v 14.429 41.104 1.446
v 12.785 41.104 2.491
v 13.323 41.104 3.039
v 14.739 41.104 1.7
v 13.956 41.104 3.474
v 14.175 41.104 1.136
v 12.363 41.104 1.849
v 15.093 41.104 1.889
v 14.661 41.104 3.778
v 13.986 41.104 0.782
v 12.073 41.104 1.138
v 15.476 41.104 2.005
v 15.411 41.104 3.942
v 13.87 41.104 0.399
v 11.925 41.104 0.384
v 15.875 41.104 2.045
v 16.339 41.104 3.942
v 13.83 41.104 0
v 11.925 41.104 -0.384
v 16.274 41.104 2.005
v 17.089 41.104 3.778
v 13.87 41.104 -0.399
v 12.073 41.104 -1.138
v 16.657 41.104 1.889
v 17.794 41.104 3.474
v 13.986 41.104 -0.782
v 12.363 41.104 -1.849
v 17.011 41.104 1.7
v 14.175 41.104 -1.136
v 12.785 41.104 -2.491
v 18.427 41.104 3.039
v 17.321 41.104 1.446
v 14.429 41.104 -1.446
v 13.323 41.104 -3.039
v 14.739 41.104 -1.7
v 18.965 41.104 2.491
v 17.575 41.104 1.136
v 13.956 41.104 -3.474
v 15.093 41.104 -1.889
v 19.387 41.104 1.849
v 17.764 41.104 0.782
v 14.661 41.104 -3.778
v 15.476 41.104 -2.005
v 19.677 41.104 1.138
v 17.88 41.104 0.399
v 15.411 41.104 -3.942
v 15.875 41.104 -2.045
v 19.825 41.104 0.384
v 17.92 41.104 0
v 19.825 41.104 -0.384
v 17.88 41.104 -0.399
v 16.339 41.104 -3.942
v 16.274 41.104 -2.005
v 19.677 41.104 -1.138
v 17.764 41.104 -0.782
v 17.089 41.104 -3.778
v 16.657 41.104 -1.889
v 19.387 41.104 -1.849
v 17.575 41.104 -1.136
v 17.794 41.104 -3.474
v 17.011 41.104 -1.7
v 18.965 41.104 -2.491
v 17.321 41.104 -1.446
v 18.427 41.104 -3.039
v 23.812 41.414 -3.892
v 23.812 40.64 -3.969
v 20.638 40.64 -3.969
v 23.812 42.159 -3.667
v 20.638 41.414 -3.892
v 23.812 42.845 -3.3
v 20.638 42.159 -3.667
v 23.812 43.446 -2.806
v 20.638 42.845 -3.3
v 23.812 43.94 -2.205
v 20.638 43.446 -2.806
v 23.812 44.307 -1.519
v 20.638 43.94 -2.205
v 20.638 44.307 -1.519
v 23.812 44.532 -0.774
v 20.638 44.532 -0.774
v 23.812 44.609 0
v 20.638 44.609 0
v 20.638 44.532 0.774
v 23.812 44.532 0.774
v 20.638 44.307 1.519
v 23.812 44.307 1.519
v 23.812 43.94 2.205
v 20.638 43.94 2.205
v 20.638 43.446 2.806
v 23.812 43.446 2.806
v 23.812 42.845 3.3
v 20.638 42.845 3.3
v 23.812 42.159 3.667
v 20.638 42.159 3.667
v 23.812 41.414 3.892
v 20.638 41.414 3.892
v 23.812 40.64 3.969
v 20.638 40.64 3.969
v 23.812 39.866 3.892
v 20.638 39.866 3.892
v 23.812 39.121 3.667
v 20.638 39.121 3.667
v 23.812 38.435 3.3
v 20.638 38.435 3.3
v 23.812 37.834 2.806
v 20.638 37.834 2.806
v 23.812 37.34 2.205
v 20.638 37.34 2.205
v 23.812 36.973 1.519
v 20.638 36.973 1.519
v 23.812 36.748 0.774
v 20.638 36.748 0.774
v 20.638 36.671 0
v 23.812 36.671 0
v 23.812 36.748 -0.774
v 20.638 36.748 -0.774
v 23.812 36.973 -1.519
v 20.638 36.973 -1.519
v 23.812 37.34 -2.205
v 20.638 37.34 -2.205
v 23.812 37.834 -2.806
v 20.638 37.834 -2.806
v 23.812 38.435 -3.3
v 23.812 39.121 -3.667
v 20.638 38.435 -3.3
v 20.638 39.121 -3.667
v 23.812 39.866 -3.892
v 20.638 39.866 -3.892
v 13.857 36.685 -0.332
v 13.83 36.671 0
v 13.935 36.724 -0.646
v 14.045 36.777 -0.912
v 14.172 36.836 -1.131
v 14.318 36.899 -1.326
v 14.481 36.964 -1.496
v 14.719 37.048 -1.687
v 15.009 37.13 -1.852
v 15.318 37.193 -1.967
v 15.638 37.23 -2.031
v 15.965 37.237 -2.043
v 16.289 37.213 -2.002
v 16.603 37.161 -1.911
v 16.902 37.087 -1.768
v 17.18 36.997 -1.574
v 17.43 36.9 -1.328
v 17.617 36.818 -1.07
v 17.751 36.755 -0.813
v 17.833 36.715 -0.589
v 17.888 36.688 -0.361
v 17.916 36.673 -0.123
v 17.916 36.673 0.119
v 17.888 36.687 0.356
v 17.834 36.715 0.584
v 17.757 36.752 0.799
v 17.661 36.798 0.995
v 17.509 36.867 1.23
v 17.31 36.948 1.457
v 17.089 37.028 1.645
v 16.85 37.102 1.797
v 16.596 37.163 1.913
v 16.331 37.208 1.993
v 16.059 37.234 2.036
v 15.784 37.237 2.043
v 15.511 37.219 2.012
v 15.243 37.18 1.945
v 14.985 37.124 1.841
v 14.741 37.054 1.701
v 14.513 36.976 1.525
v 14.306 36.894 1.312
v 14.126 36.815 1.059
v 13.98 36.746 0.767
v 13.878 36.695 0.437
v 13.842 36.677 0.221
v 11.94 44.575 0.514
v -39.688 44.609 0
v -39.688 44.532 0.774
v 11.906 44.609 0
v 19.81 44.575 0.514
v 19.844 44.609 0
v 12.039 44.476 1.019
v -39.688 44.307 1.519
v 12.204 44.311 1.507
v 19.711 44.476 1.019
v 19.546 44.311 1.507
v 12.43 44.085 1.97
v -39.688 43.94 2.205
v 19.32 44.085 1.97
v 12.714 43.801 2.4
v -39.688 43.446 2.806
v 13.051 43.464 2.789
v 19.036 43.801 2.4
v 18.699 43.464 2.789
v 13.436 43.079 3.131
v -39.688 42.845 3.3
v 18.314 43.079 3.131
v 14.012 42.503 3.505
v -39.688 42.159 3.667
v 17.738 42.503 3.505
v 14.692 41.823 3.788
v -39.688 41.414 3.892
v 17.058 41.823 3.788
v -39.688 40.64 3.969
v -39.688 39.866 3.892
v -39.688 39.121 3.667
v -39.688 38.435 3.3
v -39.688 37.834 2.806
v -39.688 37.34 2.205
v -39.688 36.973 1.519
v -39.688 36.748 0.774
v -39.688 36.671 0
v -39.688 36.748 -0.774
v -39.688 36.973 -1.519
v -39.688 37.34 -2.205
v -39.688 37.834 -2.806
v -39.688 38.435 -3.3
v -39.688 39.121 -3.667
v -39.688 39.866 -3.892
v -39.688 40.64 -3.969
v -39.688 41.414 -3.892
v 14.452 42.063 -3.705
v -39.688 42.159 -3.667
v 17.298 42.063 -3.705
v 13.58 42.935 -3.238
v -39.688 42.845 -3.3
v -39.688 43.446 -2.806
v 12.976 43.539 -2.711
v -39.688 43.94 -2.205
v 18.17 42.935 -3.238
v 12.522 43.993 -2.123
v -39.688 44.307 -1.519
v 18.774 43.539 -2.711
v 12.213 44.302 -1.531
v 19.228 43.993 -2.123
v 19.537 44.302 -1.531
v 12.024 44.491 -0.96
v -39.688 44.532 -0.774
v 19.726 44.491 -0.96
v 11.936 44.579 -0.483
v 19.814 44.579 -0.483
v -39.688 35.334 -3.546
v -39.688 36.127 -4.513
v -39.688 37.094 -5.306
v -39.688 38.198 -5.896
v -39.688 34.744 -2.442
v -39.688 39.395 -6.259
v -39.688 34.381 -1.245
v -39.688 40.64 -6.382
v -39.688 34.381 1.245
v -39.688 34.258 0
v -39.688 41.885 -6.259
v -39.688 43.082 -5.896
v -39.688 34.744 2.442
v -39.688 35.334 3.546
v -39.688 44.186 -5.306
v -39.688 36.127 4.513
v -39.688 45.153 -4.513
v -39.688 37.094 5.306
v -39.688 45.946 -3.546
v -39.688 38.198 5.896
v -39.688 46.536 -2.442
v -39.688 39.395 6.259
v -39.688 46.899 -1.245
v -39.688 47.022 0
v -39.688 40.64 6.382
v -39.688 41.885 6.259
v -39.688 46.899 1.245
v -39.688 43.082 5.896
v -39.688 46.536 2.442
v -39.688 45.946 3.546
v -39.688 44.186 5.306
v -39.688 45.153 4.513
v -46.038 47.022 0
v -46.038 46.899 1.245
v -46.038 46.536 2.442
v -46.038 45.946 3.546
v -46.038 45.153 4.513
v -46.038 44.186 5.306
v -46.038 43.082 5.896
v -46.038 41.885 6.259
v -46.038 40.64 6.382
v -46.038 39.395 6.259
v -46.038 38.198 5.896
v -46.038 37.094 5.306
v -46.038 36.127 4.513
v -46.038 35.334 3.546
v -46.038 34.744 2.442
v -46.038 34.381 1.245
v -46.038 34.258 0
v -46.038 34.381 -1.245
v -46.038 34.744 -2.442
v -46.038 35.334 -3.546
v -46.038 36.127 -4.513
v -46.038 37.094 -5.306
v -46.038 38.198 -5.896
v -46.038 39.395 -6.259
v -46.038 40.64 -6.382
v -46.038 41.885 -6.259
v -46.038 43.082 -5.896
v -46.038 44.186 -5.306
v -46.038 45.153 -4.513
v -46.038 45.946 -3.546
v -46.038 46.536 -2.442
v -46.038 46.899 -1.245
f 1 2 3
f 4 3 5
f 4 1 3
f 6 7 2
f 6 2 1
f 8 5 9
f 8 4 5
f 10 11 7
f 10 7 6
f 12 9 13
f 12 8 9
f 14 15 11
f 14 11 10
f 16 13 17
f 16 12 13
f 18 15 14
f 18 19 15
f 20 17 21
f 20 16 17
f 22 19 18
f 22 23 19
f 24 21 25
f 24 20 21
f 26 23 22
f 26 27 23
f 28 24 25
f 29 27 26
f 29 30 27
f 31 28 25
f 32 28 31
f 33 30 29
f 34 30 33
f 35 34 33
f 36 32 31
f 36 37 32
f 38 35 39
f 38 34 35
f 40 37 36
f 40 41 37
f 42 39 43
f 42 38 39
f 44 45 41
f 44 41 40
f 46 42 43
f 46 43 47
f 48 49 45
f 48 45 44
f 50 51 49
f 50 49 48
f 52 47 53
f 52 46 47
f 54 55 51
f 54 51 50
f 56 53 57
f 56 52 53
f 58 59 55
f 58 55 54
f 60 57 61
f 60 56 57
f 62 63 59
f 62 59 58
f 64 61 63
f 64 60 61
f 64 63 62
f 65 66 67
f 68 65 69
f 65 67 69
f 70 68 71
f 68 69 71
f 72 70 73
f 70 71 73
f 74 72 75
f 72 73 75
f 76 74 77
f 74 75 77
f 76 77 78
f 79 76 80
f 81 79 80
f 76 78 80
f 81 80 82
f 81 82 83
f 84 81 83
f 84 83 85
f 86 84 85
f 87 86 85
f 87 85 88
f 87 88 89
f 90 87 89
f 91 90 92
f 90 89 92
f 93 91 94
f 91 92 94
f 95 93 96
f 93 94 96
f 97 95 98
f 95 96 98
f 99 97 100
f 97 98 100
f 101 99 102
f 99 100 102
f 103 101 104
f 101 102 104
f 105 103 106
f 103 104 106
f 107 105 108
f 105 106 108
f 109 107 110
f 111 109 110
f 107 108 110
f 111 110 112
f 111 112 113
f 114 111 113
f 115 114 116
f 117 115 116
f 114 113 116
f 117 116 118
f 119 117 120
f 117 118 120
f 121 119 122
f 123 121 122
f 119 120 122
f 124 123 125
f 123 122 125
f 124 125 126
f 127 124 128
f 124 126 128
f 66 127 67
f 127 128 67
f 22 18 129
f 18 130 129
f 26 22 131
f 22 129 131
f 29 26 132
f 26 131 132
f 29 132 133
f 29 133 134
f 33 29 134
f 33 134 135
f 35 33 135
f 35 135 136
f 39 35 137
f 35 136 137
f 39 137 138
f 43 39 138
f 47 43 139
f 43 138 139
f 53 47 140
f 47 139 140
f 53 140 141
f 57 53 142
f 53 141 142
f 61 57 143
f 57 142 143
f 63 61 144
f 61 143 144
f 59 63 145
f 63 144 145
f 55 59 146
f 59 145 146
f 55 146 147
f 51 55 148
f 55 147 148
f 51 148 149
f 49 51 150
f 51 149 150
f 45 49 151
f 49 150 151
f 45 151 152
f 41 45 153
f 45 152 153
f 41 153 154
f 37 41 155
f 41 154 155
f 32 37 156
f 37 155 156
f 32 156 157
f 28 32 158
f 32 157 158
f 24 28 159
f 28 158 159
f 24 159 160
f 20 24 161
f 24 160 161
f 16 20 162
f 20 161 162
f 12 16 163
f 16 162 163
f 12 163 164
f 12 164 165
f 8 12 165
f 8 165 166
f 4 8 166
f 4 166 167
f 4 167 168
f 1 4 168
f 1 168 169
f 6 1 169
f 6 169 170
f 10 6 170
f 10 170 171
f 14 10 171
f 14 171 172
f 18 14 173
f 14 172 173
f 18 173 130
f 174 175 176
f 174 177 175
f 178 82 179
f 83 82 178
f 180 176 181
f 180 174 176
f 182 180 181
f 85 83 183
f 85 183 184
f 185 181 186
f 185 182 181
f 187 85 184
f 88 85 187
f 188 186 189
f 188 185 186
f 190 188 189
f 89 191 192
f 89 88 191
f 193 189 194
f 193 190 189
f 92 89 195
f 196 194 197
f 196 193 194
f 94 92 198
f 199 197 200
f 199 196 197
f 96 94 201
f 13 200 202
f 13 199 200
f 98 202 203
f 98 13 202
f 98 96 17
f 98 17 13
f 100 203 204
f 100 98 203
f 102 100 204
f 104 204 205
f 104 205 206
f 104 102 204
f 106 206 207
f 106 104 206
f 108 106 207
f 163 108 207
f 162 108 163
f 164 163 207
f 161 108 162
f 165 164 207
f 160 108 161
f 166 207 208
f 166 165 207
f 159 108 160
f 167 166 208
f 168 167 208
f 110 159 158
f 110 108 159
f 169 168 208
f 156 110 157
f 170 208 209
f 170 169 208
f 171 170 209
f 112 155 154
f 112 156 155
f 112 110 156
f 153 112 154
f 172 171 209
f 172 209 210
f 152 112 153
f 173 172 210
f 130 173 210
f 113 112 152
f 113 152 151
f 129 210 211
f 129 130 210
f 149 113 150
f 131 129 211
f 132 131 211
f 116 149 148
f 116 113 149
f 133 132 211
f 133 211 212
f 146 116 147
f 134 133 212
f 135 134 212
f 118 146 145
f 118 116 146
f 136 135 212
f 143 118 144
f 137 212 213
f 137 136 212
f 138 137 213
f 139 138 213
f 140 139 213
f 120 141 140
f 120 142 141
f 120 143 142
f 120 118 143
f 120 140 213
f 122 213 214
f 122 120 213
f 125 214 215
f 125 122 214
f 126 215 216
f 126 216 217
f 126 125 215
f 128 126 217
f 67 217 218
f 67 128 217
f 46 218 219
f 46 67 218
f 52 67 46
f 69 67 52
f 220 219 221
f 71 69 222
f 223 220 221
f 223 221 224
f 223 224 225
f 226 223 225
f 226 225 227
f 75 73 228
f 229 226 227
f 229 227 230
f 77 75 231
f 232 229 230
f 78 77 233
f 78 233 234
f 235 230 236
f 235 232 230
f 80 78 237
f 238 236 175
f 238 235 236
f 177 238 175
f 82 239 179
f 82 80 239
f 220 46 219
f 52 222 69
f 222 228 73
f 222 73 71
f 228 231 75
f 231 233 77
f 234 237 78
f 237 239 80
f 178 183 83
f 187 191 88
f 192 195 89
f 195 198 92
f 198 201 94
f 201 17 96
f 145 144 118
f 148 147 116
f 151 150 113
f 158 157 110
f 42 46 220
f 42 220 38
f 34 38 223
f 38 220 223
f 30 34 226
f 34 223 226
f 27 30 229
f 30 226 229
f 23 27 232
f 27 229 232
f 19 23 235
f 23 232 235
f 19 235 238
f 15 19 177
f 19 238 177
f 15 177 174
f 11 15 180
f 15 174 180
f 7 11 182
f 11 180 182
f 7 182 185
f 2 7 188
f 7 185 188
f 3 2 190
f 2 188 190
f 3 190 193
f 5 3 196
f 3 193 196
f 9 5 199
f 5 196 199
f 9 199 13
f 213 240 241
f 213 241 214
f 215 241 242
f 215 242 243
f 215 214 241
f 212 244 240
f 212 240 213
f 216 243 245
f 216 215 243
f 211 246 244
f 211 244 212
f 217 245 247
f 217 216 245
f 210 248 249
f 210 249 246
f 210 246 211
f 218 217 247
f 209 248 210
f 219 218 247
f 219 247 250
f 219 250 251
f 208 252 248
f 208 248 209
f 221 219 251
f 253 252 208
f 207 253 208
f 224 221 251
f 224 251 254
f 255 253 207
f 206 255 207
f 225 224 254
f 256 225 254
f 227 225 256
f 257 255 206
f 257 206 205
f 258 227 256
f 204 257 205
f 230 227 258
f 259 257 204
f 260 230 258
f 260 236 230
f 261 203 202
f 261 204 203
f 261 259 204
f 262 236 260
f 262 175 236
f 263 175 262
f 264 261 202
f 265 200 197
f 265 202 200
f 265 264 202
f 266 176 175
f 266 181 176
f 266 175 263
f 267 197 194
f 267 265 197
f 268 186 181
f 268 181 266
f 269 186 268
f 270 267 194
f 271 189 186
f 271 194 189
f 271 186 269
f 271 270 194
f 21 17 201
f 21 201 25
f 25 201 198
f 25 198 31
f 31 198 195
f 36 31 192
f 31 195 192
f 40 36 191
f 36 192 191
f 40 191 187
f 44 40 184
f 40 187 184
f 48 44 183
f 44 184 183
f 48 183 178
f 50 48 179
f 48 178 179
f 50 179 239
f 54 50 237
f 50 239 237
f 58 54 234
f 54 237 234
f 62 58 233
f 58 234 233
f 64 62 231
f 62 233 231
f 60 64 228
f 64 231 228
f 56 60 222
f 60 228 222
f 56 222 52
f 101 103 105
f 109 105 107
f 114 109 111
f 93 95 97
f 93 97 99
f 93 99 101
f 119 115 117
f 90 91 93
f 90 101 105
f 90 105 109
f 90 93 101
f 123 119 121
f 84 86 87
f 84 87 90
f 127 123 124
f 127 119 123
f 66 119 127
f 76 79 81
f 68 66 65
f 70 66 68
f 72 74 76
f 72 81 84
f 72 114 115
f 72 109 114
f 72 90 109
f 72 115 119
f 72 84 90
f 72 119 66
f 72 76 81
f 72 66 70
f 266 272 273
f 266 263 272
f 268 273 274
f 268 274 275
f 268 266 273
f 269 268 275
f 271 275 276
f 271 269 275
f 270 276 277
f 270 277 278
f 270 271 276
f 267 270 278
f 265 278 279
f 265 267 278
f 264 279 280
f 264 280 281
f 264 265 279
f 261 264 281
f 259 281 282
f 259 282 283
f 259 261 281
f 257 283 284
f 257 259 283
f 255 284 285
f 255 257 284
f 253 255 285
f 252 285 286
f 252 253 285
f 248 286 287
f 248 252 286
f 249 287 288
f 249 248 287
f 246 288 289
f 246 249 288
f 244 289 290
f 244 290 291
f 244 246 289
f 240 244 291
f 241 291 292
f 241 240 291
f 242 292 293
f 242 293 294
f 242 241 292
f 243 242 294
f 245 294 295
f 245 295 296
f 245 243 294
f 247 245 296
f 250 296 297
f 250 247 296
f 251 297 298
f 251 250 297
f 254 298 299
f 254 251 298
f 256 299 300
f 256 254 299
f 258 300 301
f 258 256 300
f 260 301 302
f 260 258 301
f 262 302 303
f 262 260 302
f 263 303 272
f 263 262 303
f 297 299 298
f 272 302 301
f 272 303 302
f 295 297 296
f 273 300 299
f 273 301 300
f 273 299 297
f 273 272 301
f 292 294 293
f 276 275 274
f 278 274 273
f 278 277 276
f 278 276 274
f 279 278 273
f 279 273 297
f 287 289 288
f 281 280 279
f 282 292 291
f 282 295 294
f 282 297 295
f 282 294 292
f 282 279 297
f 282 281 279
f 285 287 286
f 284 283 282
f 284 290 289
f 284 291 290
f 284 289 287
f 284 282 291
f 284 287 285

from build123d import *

# Parameters (mm, degrees)
CBORE_FOR_6_SOCKET_HEAD_CAP_SCREW1_D           = 4.0894
CBORE_FOR_6_SOCKET_HEAD_CAP_SCREW1_CBORE_D     = 7.9375
CBORE_FOR_6_SOCKET_HEAD_CAP_SCREW1_CBORE_DEPTH = 3.5052
SKETCH7_R                                      = 3.96875
BOSS_EXTRUDE1_DEPTH                            = 3.175


with BuildPart() as part:
    # Sketch1 → Revolve1 (revolve)
    with BuildSketch(Plane.XY):
        Polygon((-46.0375, 40.64), (-46.0375, 47.02175), (-39.6875, 47.02175), (-39.6875, 44.60875), (20.6375, 44.60875), (20.6375, 40.64), align=None)
    revolve(axis=Axis((-56.202964931, 40.64, 0), (1, 0, 0)))

    # CBORE for #6 Socket Head Cap Screw1 (through all)
    with Locations(Plane(origin=(0, 44.60875, 0), x_dir=(1, 0, 0), z_dir=(0, 1, 0))):
        with Locations((15.875, 0)):
            CounterBoreHole(CBORE_FOR_6_SOCKET_HEAD_CAP_SCREW1_D / 2, CBORE_FOR_6_SOCKET_HEAD_CAP_SCREW1_CBORE_D / 2, CBORE_FOR_6_SOCKET_HEAD_CAP_SCREW1_CBORE_DEPTH)

    # Sketch7 → Boss-Extrude1 (add)
    with BuildSketch(Plane(origin=(20.6375, 0, 0), x_dir=(0, 0, -1), z_dir=(1, 0, 0))):
        with Locations((0, 40.64)):
            Circle(SKETCH7_R)
    extrude(amount=BOSS_EXTRUDE1_DEPTH)


solid = part.part
